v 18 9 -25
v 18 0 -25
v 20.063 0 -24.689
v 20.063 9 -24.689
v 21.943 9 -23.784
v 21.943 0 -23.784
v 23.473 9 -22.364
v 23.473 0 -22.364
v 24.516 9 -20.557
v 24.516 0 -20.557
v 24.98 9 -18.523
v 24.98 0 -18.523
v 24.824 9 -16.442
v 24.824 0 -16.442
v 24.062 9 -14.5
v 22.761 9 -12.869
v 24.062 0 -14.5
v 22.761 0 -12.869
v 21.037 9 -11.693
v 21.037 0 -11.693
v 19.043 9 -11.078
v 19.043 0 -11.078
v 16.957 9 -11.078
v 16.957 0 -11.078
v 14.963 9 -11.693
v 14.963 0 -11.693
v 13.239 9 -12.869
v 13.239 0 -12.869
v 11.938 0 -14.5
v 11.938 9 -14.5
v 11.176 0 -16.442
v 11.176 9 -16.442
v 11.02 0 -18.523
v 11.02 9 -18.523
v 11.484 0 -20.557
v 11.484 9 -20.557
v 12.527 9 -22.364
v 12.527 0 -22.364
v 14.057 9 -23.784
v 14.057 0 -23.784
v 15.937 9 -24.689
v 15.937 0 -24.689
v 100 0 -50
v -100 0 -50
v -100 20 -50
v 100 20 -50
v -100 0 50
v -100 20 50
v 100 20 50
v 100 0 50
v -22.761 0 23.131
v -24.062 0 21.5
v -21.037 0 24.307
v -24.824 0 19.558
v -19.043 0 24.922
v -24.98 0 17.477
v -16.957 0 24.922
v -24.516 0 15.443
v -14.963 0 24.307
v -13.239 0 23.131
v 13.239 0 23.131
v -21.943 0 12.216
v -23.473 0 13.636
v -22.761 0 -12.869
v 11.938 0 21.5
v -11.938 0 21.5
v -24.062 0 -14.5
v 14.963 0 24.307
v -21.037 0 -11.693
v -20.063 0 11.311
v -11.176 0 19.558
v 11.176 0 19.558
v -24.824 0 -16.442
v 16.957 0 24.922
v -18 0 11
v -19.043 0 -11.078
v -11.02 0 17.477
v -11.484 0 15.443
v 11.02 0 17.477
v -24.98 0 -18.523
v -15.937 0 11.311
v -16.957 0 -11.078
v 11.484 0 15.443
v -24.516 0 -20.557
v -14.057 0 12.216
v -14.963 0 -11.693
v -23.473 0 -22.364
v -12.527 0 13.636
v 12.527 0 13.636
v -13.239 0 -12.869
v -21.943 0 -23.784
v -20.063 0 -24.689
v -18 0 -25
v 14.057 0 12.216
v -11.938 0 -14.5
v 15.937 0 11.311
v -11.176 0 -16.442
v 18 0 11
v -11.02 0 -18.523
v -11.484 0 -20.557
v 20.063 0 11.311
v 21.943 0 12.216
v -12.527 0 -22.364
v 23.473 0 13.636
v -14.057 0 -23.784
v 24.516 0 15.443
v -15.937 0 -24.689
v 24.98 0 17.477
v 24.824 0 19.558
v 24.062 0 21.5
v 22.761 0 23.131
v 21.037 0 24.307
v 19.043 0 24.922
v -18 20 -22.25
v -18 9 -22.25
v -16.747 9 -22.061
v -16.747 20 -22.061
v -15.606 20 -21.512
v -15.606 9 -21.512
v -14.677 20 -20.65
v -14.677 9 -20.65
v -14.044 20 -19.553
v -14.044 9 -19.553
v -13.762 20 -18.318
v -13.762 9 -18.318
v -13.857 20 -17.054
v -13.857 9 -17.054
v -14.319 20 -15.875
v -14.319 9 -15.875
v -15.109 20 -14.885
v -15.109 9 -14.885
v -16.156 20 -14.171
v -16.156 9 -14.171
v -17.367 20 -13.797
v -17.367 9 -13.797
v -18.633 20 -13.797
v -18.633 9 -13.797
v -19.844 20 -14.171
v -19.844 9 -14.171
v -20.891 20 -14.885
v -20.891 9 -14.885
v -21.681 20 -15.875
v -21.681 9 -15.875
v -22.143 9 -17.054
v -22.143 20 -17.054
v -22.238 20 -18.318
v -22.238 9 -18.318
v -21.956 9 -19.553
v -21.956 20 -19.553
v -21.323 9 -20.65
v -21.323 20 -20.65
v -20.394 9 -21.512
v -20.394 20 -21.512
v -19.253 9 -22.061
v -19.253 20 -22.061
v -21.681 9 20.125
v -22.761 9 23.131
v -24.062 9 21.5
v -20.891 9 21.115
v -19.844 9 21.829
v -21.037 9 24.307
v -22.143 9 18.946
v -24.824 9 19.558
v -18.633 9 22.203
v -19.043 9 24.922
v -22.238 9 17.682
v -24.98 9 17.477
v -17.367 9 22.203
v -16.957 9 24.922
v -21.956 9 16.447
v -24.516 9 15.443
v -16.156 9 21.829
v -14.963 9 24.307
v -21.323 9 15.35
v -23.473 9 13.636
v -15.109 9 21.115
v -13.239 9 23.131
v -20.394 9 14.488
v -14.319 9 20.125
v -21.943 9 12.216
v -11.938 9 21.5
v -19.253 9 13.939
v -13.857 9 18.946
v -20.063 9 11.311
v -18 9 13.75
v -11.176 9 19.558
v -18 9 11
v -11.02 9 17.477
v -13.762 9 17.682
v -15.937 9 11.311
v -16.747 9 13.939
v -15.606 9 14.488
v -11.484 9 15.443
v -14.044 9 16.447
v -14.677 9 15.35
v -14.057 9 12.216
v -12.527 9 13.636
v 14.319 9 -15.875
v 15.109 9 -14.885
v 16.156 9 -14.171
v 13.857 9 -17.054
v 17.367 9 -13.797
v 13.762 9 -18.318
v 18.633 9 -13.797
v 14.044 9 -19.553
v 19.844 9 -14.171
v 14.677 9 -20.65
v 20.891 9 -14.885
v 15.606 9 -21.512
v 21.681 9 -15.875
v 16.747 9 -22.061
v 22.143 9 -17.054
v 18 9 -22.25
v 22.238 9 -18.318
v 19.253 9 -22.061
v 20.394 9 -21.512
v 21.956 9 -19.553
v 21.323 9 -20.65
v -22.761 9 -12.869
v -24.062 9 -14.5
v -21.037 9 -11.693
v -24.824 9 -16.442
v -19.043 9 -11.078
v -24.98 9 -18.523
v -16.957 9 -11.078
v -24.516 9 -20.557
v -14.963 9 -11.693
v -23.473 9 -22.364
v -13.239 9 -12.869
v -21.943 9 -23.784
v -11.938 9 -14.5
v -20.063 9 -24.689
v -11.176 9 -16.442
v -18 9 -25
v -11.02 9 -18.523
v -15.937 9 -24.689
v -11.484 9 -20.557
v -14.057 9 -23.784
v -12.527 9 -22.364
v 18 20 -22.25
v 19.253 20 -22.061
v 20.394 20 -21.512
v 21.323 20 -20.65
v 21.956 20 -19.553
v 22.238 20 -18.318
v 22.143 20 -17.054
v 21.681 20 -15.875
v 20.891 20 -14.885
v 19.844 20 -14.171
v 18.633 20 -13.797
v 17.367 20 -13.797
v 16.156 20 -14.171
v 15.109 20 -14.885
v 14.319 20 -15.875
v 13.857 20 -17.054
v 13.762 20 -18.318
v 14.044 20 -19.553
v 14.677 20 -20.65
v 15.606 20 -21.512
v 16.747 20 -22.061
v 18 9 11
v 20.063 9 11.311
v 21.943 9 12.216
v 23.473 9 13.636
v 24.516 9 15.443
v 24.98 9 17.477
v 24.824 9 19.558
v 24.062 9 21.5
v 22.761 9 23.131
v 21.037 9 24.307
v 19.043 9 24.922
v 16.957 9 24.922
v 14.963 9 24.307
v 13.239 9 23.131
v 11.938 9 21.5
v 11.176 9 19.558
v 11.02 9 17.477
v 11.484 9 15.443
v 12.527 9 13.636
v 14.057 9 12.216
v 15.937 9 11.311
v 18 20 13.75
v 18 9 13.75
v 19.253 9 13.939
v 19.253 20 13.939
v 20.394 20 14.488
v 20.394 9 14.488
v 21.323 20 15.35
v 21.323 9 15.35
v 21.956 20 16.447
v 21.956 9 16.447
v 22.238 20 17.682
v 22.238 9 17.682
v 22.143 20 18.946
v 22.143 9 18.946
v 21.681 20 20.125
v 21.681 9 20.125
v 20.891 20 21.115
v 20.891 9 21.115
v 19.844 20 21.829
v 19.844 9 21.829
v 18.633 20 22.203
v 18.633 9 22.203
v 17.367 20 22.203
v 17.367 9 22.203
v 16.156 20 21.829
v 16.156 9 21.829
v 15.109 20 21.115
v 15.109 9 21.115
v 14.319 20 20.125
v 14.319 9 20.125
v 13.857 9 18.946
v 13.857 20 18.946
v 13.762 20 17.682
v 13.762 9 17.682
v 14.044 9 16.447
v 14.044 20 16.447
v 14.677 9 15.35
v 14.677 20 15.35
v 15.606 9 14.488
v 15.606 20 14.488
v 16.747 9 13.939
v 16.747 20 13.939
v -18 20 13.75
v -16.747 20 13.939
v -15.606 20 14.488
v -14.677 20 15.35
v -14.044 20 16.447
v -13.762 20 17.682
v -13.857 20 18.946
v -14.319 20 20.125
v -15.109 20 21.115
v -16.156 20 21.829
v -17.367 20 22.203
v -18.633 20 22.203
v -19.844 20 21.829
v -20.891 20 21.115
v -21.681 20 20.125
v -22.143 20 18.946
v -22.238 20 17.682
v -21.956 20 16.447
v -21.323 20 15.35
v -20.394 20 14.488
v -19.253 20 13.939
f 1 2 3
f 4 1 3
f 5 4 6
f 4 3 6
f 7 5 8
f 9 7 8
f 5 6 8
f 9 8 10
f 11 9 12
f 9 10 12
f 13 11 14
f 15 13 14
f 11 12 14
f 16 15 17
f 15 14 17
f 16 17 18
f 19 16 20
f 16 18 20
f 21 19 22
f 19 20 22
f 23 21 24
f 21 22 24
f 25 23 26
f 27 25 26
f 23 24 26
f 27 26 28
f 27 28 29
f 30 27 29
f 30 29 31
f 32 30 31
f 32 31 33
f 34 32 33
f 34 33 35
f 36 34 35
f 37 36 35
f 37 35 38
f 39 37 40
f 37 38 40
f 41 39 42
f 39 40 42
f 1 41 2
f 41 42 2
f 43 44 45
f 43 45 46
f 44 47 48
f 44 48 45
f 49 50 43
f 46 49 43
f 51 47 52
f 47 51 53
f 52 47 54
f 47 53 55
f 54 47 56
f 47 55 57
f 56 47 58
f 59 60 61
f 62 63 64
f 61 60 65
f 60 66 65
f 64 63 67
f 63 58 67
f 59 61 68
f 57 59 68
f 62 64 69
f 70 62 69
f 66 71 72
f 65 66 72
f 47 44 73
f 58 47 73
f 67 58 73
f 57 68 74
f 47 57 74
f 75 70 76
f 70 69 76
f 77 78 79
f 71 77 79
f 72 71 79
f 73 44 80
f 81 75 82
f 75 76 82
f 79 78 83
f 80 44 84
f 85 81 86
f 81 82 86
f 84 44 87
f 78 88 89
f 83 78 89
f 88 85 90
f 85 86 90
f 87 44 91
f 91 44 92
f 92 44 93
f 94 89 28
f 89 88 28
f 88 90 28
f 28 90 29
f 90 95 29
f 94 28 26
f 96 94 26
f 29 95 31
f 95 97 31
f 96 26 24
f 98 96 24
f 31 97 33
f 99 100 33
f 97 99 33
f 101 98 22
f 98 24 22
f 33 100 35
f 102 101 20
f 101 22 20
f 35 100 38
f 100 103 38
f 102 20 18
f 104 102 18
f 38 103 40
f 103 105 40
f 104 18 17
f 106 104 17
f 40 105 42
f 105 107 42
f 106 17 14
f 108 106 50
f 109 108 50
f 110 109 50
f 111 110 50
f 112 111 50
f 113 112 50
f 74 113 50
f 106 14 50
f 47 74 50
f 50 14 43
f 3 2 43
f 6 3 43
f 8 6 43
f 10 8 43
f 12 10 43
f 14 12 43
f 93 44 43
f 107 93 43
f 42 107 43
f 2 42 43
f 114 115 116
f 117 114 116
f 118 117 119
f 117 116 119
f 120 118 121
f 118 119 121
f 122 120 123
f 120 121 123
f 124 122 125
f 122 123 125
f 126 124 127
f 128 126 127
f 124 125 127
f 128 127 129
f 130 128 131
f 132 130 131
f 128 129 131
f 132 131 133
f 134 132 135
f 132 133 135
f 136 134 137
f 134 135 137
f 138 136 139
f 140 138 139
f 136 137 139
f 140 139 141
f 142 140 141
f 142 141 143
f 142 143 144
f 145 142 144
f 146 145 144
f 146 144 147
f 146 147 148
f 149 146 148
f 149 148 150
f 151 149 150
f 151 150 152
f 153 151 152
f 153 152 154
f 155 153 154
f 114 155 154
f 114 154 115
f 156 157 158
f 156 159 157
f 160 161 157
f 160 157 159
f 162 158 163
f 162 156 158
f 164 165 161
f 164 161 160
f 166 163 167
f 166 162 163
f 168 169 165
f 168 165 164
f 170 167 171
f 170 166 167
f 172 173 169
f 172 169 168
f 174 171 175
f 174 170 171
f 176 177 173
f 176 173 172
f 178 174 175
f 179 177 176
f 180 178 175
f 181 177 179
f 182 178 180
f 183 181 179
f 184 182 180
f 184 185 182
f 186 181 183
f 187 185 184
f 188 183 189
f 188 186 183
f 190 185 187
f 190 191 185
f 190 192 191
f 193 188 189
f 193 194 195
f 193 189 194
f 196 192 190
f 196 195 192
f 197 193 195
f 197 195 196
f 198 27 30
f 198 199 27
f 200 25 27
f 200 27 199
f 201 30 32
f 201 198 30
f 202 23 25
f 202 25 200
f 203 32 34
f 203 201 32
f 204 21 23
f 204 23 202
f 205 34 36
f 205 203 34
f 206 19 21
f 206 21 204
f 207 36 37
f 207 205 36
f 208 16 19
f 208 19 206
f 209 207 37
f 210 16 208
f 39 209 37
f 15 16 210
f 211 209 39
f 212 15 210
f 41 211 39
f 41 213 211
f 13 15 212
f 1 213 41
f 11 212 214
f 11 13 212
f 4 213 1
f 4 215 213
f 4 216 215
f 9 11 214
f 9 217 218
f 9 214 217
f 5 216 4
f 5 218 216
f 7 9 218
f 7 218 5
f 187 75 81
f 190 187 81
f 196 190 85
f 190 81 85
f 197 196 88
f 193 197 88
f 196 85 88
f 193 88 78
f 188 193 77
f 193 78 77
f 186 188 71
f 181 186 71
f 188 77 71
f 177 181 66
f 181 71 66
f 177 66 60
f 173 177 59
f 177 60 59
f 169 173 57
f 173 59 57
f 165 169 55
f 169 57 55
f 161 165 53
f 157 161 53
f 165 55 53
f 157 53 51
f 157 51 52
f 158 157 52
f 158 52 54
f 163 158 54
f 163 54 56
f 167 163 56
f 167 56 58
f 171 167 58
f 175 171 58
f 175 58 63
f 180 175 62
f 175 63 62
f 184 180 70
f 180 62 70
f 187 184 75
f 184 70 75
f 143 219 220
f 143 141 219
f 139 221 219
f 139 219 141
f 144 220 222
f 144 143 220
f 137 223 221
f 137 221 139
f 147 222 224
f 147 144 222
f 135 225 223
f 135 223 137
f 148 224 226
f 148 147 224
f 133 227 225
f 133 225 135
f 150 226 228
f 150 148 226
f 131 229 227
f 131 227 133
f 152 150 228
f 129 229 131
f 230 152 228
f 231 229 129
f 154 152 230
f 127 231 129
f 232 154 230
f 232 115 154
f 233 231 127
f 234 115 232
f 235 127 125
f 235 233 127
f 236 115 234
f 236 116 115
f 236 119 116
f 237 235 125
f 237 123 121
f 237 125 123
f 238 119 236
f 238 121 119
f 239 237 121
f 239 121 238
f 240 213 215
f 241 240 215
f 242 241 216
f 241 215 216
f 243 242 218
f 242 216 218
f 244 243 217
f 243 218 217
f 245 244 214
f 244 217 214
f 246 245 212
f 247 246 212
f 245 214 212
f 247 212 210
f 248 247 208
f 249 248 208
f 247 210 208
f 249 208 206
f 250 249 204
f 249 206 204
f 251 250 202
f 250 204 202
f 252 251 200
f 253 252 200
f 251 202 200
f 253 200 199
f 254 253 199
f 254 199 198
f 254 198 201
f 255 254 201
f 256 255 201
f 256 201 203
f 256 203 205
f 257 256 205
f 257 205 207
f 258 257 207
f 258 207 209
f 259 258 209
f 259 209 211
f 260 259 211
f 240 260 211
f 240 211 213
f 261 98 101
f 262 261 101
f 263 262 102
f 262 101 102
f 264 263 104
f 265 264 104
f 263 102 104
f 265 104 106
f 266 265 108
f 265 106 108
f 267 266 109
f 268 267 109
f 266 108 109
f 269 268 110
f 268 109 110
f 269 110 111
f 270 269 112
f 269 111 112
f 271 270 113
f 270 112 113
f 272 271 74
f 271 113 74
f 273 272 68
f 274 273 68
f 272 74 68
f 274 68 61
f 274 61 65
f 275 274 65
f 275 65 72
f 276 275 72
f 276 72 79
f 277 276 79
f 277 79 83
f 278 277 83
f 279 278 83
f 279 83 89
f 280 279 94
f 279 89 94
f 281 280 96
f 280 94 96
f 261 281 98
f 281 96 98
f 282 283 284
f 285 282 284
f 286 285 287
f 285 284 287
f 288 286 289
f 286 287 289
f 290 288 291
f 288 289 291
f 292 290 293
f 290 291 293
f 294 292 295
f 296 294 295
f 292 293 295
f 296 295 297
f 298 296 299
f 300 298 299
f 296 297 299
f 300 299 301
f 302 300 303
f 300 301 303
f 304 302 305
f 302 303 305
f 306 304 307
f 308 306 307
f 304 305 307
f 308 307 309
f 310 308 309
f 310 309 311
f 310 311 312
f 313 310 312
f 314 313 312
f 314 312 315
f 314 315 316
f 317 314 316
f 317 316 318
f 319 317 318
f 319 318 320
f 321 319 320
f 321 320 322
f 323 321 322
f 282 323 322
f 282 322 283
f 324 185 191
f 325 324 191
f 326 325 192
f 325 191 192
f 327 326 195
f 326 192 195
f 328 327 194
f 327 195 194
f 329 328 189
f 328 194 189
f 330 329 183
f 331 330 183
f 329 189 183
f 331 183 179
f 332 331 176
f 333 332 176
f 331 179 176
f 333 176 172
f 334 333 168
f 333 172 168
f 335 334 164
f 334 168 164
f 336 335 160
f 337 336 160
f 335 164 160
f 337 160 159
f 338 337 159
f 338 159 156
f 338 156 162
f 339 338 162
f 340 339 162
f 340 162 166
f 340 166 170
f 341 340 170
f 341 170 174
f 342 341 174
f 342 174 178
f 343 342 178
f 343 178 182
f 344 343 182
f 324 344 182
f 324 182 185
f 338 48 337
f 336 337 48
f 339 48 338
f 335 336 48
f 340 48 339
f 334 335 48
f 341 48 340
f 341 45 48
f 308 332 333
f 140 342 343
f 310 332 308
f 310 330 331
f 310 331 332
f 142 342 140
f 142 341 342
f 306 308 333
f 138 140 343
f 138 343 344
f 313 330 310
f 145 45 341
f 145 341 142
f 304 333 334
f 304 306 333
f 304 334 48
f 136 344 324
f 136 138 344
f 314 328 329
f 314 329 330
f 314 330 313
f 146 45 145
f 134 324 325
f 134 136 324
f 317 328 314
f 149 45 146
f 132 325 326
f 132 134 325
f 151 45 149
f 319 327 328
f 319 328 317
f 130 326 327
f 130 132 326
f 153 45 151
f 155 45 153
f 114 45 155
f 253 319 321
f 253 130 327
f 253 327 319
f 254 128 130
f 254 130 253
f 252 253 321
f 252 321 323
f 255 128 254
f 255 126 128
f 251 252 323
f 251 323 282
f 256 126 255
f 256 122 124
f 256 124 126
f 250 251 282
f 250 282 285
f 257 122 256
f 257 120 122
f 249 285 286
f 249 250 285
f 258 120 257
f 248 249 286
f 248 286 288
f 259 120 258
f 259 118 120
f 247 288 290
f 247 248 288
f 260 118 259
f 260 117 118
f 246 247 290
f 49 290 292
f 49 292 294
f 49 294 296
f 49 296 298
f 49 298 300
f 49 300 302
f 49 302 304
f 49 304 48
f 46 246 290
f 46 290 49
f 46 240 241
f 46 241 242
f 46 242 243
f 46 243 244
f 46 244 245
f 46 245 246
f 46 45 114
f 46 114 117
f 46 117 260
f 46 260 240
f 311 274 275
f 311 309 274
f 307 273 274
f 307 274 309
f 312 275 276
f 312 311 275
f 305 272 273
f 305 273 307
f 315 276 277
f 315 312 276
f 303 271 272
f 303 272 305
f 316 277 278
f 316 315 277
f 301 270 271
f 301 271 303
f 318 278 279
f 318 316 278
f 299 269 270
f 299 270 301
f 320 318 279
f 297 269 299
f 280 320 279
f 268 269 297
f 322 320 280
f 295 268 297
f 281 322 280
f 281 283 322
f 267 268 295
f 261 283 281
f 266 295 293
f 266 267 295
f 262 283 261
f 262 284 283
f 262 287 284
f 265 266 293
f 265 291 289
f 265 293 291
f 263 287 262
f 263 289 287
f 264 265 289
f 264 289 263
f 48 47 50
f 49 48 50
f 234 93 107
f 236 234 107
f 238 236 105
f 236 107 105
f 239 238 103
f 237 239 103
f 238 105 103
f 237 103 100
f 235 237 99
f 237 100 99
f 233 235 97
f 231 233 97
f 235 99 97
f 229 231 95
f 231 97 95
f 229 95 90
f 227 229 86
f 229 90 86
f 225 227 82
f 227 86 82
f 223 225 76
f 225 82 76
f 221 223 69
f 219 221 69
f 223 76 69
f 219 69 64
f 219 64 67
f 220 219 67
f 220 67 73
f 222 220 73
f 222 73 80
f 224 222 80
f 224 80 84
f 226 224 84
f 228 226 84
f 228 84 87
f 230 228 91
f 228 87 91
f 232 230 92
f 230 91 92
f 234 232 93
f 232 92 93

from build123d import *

# Parameters (mm, degrees)
CROQUIS1_W              = 200
CROQUIS1_H              = 100
SALIENTE_EXTRUIR1_DEPTH = 20
CROQUIS2_R              = 7
CORTAR_EXTRUIR1_DEPTH   = 9
CROQUIS3_R              = 4.25
CORTAR_EXTRUIR2_DEPTH   = 113.343224095


with BuildPart() as part:
    # Croquis1 → Saliente-Extruir1 (new body)
    with BuildSketch(Plane(origin=(0, 0, 0), x_dir=(1, 0, 0), z_dir=(0, 1, 0))):
        Rectangle(CROQUIS1_W, CROQUIS1_H)
    extrude(amount=SALIENTE_EXTRUIR1_DEPTH)

    # Croquis2 → Cortar-Extruir1 (cut)
    with BuildSketch(Plane.XZ):
        with Locations(Location((-18, 18, 0), (0, 0, 270))):
            Circle(CROQUIS2_R)
        with Locations(Location((-18, -18, 0), (0, 0, 270))):
            Circle(CROQUIS2_R)
        with Locations(Location((18, 18, 0), (0, 0, 270))):
            Circle(CROQUIS2_R)
        with Locations(Location((18, -18, 0), (0, 0, 270))):
            Circle(CROQUIS2_R)
    extrude(amount=-CORTAR_EXTRUIR1_DEPTH, mode=Mode.SUBTRACT)

    # Croquis3 → Cortar-Extruir2 (cut, through all)
    with BuildSketch(Plane.XZ.offset(-9)):
        with Locations(Location((-18, 18, 0), (0, 0, 270))):
            Circle(CROQUIS3_R)
        with Locations(Location((18, 18, 0), (0, 0, 270))):
            Circle(CROQUIS3_R)
        with Locations(Location((18, -18, 0), (0, 0, 270))):
            Circle(CROQUIS3_R)
        with Locations(Location((-18, -18, 0), (0, 0, 270))):
            Circle(CROQUIS3_R)
    extrude(amount=-CORTAR_EXTRUIR2_DEPTH, mode=Mode.SUBTRACT)


solid = part.part
